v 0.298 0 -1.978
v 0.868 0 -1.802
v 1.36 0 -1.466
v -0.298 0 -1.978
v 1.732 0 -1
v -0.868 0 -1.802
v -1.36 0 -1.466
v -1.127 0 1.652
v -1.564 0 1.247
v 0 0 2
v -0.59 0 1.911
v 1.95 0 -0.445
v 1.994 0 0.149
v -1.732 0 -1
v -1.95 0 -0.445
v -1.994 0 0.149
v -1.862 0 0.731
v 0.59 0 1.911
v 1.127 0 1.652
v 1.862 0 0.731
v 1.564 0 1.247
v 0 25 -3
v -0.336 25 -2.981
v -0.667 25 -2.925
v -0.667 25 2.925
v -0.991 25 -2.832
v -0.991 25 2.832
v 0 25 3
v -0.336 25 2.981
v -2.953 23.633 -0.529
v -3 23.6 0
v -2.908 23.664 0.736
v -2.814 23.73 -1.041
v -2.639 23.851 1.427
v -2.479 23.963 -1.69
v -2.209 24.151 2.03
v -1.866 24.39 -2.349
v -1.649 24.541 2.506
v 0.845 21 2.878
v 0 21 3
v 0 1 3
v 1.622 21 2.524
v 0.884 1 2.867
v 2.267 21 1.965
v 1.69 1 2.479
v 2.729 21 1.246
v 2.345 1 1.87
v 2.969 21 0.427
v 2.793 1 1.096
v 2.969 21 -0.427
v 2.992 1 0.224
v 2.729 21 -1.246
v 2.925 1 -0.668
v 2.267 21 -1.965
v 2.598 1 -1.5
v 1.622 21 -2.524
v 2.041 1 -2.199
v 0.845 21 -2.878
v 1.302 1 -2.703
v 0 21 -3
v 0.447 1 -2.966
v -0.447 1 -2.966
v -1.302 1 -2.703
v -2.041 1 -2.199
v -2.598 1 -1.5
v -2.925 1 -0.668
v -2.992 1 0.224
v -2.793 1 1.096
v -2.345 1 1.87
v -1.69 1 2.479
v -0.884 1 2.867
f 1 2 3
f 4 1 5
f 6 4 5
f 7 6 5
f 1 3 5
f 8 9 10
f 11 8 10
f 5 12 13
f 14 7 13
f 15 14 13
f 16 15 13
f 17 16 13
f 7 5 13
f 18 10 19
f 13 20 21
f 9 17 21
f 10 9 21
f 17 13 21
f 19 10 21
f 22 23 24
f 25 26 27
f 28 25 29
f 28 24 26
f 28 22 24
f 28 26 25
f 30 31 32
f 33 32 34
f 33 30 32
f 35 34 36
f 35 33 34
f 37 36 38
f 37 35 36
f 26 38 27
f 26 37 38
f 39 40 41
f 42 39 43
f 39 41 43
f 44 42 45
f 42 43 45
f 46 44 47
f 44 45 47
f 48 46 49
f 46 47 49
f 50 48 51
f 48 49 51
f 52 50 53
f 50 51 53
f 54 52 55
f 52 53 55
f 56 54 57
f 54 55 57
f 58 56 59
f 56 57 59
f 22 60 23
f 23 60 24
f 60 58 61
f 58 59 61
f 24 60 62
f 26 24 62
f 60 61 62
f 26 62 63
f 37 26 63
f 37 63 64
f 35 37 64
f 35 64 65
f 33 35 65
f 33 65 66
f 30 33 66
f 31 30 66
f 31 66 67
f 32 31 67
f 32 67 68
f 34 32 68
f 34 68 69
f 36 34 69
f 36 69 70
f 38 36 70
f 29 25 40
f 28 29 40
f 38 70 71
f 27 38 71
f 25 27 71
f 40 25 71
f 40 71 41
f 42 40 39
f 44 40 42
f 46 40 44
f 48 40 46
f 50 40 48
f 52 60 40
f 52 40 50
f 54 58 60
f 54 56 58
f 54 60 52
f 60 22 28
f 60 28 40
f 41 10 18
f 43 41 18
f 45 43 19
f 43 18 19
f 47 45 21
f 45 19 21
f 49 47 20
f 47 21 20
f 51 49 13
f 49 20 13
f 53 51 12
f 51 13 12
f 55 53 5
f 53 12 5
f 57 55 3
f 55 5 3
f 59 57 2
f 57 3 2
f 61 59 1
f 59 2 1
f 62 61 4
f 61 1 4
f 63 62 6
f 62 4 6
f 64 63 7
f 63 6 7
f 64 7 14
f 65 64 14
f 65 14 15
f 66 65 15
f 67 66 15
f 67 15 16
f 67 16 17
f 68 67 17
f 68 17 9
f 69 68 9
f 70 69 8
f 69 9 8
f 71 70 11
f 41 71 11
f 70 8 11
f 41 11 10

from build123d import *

# Parameters (mm, degrees)
SKETCH_1_R               = 3
EXTRUDE_1_DEPTH          = 25
CHAMFER_1_SIZE           = 1
CUT_EXTRUDE_1_DEPTH      = 26.357444666
CUT_EXTRUDE_1_DEPTH_BACK = 26.357444666
CUT_EXTRUDE_2_DEPTH      = 26.357444666
CUT_EXTRUDE_2_DEPTH_BACK = 26.357444666


with BuildPart() as part:
    # 草图1 → 凸台-拉伸1 (new body)
    with BuildSketch(Plane(origin=(0, 0, 0), x_dir=(1, 0, 0), z_dir=(0, 1, 0))):
        with Locations(Location((0, 0, 0), (0, 0, 270))):
            Circle(SKETCH_1_R)
    extrude(amount=EXTRUDE_1_DEPTH)

    # 倒角1
    chamfer_1_edges = [part.edges().sort_by_distance(p)[0] for p in [
        (0, 0, -3),
    ]]
    chamfer(chamfer_1_edges, length=CHAMFER_1_SIZE)

    # 草图2 → 切除-拉伸1 (cut, two sides: drawn at the far end of the back side and taken through both)
    with BuildSketch(Plane.XY.offset(-CUT_EXTRUDE_1_DEPTH_BACK)):
        Polygon((-52.748448143, -11.06198798), (-3, 23.6), (-0.990656871, 25), (48.757791272, 59.66198798), (-20.566184689, 159.158884265), (-122.072424103, 88.434908305), align=None)
    extrude(amount=CUT_EXTRUDE_1_DEPTH + CUT_EXTRUDE_1_DEPTH_BACK, mode=Mode.SUBTRACT)

    # 草图3 → 切除-拉伸2 (cut, two sides: drawn at the far end of the back side and taken through both)
    with BuildSketch(Plane.XY.offset(-CUT_EXTRUDE_2_DEPTH_BACK)):
        Polygon((0, 85.358713248), (0, 25), (0, 21), (3, 21), (63.358713248, 21), (149.384538564, 105.689163643), (86.025825316, 170.047876891), align=None)
    extrude(amount=CUT_EXTRUDE_2_DEPTH + CUT_EXTRUDE_2_DEPTH_BACK, mode=Mode.SUBTRACT)


solid = part.part
